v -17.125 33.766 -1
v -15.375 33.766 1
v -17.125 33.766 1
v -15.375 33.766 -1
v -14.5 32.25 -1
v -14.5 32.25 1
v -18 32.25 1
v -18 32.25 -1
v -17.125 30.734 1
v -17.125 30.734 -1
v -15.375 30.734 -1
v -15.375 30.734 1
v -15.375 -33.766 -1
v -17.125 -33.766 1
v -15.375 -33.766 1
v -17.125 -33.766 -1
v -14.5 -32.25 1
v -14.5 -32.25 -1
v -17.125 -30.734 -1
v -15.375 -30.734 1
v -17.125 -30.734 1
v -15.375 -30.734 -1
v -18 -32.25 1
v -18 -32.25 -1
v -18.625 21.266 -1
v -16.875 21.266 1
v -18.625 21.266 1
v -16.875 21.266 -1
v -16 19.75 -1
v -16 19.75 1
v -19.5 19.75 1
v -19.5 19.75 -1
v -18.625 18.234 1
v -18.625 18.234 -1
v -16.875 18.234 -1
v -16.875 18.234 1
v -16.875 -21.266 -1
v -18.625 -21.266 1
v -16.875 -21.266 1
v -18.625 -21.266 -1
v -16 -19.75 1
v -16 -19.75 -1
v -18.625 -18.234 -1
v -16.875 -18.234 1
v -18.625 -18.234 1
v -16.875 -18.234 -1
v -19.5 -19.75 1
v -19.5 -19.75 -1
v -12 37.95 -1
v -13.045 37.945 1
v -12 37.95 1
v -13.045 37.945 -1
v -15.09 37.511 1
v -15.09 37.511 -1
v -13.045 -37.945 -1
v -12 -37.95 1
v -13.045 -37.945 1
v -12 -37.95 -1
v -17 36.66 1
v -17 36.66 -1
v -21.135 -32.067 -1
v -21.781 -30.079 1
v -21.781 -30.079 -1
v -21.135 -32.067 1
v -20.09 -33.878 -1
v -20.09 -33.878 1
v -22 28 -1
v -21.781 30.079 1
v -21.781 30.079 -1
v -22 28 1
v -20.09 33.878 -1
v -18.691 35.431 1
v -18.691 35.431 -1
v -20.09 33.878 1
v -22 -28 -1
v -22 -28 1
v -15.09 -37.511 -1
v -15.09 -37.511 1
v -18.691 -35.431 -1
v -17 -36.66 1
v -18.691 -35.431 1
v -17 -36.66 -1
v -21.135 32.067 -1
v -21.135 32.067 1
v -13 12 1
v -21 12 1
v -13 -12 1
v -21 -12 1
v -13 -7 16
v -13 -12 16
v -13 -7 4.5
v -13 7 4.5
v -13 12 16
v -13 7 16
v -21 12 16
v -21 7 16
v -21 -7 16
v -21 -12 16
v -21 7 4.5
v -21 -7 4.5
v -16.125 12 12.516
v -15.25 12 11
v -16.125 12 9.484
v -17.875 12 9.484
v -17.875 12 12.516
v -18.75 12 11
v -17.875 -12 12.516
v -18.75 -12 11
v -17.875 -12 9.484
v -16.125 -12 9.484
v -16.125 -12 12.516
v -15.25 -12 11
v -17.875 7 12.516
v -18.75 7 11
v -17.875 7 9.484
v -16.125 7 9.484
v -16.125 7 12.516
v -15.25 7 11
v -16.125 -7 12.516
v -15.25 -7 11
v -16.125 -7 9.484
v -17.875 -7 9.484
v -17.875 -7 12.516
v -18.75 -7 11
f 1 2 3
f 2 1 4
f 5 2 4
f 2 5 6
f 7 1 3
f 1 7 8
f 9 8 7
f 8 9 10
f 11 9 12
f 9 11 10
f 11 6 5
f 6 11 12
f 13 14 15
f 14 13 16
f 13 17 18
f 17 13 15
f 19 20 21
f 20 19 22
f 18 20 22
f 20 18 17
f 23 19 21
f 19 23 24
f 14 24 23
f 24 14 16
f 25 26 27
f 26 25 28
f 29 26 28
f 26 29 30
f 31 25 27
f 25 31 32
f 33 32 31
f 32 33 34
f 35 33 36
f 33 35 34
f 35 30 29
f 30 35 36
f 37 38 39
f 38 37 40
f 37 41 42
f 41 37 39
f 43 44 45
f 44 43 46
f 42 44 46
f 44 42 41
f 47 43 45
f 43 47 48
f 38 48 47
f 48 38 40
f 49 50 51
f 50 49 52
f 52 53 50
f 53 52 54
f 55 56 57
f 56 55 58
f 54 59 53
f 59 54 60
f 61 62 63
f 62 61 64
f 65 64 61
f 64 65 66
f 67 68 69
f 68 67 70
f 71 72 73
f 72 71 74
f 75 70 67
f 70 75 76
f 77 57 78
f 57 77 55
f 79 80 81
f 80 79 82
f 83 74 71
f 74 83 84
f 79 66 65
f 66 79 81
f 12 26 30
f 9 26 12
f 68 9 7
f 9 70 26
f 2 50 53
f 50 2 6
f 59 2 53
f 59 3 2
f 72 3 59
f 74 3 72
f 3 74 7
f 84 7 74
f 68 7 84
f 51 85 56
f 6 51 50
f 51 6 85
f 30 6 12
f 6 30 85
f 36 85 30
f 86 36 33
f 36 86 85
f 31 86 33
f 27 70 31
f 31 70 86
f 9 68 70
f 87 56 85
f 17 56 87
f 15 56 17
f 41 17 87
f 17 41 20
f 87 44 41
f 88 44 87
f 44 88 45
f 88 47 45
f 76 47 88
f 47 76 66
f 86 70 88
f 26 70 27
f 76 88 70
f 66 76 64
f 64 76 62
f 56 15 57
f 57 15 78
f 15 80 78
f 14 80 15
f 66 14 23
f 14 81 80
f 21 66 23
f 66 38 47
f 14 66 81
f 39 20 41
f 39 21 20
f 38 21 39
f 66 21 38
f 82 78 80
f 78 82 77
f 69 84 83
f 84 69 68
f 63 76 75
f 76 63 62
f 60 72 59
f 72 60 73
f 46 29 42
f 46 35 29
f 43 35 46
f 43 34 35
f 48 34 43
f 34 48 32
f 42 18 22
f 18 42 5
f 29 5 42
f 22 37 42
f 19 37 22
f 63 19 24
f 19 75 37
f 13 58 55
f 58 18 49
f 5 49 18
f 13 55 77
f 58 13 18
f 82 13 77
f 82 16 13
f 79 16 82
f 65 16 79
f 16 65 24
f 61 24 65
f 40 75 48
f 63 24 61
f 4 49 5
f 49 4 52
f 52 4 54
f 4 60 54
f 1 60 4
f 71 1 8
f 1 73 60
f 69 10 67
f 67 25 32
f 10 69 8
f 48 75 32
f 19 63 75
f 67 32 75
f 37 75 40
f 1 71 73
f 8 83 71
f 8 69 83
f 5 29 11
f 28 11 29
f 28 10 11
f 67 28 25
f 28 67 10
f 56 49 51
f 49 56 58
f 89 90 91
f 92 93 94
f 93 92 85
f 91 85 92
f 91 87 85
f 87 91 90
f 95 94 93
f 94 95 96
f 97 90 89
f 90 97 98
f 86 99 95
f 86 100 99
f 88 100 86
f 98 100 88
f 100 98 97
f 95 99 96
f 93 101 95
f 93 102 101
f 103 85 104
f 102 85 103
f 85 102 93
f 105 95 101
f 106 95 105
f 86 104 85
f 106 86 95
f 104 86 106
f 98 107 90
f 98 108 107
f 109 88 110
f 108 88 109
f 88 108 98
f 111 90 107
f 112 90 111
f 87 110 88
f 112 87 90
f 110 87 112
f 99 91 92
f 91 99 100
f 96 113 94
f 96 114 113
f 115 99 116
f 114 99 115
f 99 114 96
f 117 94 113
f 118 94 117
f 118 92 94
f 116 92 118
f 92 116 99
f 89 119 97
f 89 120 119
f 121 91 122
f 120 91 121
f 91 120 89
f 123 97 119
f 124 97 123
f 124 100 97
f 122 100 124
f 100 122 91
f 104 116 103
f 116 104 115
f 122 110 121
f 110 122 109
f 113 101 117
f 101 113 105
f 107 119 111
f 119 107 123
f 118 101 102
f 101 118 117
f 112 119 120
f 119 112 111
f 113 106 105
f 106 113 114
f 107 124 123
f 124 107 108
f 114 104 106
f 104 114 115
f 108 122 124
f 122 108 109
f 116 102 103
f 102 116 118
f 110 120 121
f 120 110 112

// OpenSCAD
// file: commonparts.scad
//servoArm(false);
//    basePlate(length=44,width=76, height=2, radius=10);
    
//    translate([0,0,2]){
//        mirror([0,1,0]){
//            basePlate(length=44,width=76, height=2, radius=10);
//        }
//    }

plates(44,76, 2, 10);

    
    module servoArm(dif = false)
    {
            holeStart = 33;
            translate([0,0,4]){
                difference(){
                    union(){
                        cylinder(d=10, h=8, center=true);
                        difference(){
                            translate([0,0,-2.85]){
                                hull(){
                                    cylinder(d=14, h=2.3, center=true);
                                    translate([30,0,0]){
                                        cylinder(d=9, h=2.3, center=true);
                                    }
                                }
                            }
                            
                            for (i = [1:6]){
                                translate([holeStart  - 3*i,0,0]){ cylinder(d=1.5, h=10, center=true); }
                            }
                            
                        }

                    }
                    cylinder(d=5, h=10, center=true);
                    translate([0,0,4]){
                        cylinder(d=6, h=5, center=true);
                    }
                    translate([0,0,-2]){
                        cylinder(d=6, h=5, center=true);
                    }
                }
            }
            
            if (dif) {
                for (i = [1:6]){
                    translate([holeStart  - 3*i,0,0]){ cylinder(d=1.6, h=16, center=true); }
                }
                    cylinder(d=4, h=20, center=true);
                    translate([0,0,5.5]){
                        cylinder(d=7, h=5, center=true);
                    }
                    translate([0,0,2.5]){
                        cylinder(d=7, h=5, center=true);
                    }
            }
            
    }
    
    module basePlate(length=10, width=10, height=10, radius=2, holes = true)
    {
        translate([length/4-1,0,0]){
            difference(){
                hull(){
            
                    cube([length - 2*radius, width, height], center=true);
                    translate([-length/2, width/2-radius, 0]){
                        cylinder(d=2*radius, h=height, center=true);
                    }
                    translate([-length/2, -(width/2-radius), 0]){
                        cylinder(d=2*radius, h=height, center=true);
                    }
                }
                if (holes){
                    translate([-length/8, (width/2-3)-.75, 0]){ cylinder(d=3.5, h=10, center=true); }
                    translate([-length/8, -(width/2-3 - .75), 0]){ cylinder(d=3.5, h=10, center=true); }

                    translate([-(length+radius)/2 + .75, width/2-(radius/2)-.75, 0]){ cylinder(d=3.5, h=10, center=true); }
                    translate([-(length+radius)/2 + .75, -(width/2-(radius/2)-.75), 0]){ cylinder(d=3.5, h=10, center=true); }

                    translate([-(length+radius)/2-.75, width/4+.75, 0]){ cylinder(d=3.5, h=10, center=true); }
                    translate([-(length+radius)/2-.75, -(width/4+.75), 0]){ cylinder(d=3.5, h=10, center=true); }


//                    translate([-(length+radius)/2-.75, width/4+.75, 0]){ cylinder(d=3.5, h=10, center=true); }
//                    translate([-length/2-6.5, -width/4-.75, 0]){ cylinder(d=3.5, h=10, center=true); }
                }
            }
        }
    }
    
    
module legBase(length, width, thick)
{
    translate([0,0,thick/2]){
            hull(){
                cylinder(d=width, h=thick, center=true);
                translate([length-width, 0,0]){
                    cylinder(d=width, h=thick, center=true);
                }
            }
        }
}
    
    module plates(l, w, h, r = 10, d=18){
        singlePlate(l, w, h, r, d);

        mirror([1,0,0]){
            singlePlate(l, w, h, r, d);
        }
    }
    
    module singlePlate(l, w, h, r = 10, d=18){
        translate([-d,0,0]){ 
            union(){
                difference(){
                    basePlate(l,w,h,r); 
                    translate([0,w/2,0]){
                        cube([l+2,w+2,h+2], center=true); 
                    }
                    color([0,0,1]){
                        translate([l/2,0,0]){
                            cube([l/2,w+2,h+2], center=true); 
                        }
                    }

                    color([0,0,1]){
                        translate([0,2,0]){
                            basePlate(l-16,w-12,h+2,r-4, false); 
                        }
                    }
                }
                
            }            
        }
        
    }
    
// main file
use <./commonparts.scad>

hipConnector(44,76,2);

module hipConnector(length, width, height)
{
    difference(){
        basePlate(length, width, height, 10);
        translate([10,0,0]){
            cube([length, width+2, height+2], center=true);
        }
    }
        
    translate([-17,0,8]){
        difference(){
            cube([8,24,16], center=true);
            translate([0,0,4]){
                cube([10,14,15], center=true);
            }
            translate([0,0,3]){
                rotate([90,0,0]){
                    cylinder(d=3.5, h=30, center=true);
                }
            }
            
        }
    }
}
